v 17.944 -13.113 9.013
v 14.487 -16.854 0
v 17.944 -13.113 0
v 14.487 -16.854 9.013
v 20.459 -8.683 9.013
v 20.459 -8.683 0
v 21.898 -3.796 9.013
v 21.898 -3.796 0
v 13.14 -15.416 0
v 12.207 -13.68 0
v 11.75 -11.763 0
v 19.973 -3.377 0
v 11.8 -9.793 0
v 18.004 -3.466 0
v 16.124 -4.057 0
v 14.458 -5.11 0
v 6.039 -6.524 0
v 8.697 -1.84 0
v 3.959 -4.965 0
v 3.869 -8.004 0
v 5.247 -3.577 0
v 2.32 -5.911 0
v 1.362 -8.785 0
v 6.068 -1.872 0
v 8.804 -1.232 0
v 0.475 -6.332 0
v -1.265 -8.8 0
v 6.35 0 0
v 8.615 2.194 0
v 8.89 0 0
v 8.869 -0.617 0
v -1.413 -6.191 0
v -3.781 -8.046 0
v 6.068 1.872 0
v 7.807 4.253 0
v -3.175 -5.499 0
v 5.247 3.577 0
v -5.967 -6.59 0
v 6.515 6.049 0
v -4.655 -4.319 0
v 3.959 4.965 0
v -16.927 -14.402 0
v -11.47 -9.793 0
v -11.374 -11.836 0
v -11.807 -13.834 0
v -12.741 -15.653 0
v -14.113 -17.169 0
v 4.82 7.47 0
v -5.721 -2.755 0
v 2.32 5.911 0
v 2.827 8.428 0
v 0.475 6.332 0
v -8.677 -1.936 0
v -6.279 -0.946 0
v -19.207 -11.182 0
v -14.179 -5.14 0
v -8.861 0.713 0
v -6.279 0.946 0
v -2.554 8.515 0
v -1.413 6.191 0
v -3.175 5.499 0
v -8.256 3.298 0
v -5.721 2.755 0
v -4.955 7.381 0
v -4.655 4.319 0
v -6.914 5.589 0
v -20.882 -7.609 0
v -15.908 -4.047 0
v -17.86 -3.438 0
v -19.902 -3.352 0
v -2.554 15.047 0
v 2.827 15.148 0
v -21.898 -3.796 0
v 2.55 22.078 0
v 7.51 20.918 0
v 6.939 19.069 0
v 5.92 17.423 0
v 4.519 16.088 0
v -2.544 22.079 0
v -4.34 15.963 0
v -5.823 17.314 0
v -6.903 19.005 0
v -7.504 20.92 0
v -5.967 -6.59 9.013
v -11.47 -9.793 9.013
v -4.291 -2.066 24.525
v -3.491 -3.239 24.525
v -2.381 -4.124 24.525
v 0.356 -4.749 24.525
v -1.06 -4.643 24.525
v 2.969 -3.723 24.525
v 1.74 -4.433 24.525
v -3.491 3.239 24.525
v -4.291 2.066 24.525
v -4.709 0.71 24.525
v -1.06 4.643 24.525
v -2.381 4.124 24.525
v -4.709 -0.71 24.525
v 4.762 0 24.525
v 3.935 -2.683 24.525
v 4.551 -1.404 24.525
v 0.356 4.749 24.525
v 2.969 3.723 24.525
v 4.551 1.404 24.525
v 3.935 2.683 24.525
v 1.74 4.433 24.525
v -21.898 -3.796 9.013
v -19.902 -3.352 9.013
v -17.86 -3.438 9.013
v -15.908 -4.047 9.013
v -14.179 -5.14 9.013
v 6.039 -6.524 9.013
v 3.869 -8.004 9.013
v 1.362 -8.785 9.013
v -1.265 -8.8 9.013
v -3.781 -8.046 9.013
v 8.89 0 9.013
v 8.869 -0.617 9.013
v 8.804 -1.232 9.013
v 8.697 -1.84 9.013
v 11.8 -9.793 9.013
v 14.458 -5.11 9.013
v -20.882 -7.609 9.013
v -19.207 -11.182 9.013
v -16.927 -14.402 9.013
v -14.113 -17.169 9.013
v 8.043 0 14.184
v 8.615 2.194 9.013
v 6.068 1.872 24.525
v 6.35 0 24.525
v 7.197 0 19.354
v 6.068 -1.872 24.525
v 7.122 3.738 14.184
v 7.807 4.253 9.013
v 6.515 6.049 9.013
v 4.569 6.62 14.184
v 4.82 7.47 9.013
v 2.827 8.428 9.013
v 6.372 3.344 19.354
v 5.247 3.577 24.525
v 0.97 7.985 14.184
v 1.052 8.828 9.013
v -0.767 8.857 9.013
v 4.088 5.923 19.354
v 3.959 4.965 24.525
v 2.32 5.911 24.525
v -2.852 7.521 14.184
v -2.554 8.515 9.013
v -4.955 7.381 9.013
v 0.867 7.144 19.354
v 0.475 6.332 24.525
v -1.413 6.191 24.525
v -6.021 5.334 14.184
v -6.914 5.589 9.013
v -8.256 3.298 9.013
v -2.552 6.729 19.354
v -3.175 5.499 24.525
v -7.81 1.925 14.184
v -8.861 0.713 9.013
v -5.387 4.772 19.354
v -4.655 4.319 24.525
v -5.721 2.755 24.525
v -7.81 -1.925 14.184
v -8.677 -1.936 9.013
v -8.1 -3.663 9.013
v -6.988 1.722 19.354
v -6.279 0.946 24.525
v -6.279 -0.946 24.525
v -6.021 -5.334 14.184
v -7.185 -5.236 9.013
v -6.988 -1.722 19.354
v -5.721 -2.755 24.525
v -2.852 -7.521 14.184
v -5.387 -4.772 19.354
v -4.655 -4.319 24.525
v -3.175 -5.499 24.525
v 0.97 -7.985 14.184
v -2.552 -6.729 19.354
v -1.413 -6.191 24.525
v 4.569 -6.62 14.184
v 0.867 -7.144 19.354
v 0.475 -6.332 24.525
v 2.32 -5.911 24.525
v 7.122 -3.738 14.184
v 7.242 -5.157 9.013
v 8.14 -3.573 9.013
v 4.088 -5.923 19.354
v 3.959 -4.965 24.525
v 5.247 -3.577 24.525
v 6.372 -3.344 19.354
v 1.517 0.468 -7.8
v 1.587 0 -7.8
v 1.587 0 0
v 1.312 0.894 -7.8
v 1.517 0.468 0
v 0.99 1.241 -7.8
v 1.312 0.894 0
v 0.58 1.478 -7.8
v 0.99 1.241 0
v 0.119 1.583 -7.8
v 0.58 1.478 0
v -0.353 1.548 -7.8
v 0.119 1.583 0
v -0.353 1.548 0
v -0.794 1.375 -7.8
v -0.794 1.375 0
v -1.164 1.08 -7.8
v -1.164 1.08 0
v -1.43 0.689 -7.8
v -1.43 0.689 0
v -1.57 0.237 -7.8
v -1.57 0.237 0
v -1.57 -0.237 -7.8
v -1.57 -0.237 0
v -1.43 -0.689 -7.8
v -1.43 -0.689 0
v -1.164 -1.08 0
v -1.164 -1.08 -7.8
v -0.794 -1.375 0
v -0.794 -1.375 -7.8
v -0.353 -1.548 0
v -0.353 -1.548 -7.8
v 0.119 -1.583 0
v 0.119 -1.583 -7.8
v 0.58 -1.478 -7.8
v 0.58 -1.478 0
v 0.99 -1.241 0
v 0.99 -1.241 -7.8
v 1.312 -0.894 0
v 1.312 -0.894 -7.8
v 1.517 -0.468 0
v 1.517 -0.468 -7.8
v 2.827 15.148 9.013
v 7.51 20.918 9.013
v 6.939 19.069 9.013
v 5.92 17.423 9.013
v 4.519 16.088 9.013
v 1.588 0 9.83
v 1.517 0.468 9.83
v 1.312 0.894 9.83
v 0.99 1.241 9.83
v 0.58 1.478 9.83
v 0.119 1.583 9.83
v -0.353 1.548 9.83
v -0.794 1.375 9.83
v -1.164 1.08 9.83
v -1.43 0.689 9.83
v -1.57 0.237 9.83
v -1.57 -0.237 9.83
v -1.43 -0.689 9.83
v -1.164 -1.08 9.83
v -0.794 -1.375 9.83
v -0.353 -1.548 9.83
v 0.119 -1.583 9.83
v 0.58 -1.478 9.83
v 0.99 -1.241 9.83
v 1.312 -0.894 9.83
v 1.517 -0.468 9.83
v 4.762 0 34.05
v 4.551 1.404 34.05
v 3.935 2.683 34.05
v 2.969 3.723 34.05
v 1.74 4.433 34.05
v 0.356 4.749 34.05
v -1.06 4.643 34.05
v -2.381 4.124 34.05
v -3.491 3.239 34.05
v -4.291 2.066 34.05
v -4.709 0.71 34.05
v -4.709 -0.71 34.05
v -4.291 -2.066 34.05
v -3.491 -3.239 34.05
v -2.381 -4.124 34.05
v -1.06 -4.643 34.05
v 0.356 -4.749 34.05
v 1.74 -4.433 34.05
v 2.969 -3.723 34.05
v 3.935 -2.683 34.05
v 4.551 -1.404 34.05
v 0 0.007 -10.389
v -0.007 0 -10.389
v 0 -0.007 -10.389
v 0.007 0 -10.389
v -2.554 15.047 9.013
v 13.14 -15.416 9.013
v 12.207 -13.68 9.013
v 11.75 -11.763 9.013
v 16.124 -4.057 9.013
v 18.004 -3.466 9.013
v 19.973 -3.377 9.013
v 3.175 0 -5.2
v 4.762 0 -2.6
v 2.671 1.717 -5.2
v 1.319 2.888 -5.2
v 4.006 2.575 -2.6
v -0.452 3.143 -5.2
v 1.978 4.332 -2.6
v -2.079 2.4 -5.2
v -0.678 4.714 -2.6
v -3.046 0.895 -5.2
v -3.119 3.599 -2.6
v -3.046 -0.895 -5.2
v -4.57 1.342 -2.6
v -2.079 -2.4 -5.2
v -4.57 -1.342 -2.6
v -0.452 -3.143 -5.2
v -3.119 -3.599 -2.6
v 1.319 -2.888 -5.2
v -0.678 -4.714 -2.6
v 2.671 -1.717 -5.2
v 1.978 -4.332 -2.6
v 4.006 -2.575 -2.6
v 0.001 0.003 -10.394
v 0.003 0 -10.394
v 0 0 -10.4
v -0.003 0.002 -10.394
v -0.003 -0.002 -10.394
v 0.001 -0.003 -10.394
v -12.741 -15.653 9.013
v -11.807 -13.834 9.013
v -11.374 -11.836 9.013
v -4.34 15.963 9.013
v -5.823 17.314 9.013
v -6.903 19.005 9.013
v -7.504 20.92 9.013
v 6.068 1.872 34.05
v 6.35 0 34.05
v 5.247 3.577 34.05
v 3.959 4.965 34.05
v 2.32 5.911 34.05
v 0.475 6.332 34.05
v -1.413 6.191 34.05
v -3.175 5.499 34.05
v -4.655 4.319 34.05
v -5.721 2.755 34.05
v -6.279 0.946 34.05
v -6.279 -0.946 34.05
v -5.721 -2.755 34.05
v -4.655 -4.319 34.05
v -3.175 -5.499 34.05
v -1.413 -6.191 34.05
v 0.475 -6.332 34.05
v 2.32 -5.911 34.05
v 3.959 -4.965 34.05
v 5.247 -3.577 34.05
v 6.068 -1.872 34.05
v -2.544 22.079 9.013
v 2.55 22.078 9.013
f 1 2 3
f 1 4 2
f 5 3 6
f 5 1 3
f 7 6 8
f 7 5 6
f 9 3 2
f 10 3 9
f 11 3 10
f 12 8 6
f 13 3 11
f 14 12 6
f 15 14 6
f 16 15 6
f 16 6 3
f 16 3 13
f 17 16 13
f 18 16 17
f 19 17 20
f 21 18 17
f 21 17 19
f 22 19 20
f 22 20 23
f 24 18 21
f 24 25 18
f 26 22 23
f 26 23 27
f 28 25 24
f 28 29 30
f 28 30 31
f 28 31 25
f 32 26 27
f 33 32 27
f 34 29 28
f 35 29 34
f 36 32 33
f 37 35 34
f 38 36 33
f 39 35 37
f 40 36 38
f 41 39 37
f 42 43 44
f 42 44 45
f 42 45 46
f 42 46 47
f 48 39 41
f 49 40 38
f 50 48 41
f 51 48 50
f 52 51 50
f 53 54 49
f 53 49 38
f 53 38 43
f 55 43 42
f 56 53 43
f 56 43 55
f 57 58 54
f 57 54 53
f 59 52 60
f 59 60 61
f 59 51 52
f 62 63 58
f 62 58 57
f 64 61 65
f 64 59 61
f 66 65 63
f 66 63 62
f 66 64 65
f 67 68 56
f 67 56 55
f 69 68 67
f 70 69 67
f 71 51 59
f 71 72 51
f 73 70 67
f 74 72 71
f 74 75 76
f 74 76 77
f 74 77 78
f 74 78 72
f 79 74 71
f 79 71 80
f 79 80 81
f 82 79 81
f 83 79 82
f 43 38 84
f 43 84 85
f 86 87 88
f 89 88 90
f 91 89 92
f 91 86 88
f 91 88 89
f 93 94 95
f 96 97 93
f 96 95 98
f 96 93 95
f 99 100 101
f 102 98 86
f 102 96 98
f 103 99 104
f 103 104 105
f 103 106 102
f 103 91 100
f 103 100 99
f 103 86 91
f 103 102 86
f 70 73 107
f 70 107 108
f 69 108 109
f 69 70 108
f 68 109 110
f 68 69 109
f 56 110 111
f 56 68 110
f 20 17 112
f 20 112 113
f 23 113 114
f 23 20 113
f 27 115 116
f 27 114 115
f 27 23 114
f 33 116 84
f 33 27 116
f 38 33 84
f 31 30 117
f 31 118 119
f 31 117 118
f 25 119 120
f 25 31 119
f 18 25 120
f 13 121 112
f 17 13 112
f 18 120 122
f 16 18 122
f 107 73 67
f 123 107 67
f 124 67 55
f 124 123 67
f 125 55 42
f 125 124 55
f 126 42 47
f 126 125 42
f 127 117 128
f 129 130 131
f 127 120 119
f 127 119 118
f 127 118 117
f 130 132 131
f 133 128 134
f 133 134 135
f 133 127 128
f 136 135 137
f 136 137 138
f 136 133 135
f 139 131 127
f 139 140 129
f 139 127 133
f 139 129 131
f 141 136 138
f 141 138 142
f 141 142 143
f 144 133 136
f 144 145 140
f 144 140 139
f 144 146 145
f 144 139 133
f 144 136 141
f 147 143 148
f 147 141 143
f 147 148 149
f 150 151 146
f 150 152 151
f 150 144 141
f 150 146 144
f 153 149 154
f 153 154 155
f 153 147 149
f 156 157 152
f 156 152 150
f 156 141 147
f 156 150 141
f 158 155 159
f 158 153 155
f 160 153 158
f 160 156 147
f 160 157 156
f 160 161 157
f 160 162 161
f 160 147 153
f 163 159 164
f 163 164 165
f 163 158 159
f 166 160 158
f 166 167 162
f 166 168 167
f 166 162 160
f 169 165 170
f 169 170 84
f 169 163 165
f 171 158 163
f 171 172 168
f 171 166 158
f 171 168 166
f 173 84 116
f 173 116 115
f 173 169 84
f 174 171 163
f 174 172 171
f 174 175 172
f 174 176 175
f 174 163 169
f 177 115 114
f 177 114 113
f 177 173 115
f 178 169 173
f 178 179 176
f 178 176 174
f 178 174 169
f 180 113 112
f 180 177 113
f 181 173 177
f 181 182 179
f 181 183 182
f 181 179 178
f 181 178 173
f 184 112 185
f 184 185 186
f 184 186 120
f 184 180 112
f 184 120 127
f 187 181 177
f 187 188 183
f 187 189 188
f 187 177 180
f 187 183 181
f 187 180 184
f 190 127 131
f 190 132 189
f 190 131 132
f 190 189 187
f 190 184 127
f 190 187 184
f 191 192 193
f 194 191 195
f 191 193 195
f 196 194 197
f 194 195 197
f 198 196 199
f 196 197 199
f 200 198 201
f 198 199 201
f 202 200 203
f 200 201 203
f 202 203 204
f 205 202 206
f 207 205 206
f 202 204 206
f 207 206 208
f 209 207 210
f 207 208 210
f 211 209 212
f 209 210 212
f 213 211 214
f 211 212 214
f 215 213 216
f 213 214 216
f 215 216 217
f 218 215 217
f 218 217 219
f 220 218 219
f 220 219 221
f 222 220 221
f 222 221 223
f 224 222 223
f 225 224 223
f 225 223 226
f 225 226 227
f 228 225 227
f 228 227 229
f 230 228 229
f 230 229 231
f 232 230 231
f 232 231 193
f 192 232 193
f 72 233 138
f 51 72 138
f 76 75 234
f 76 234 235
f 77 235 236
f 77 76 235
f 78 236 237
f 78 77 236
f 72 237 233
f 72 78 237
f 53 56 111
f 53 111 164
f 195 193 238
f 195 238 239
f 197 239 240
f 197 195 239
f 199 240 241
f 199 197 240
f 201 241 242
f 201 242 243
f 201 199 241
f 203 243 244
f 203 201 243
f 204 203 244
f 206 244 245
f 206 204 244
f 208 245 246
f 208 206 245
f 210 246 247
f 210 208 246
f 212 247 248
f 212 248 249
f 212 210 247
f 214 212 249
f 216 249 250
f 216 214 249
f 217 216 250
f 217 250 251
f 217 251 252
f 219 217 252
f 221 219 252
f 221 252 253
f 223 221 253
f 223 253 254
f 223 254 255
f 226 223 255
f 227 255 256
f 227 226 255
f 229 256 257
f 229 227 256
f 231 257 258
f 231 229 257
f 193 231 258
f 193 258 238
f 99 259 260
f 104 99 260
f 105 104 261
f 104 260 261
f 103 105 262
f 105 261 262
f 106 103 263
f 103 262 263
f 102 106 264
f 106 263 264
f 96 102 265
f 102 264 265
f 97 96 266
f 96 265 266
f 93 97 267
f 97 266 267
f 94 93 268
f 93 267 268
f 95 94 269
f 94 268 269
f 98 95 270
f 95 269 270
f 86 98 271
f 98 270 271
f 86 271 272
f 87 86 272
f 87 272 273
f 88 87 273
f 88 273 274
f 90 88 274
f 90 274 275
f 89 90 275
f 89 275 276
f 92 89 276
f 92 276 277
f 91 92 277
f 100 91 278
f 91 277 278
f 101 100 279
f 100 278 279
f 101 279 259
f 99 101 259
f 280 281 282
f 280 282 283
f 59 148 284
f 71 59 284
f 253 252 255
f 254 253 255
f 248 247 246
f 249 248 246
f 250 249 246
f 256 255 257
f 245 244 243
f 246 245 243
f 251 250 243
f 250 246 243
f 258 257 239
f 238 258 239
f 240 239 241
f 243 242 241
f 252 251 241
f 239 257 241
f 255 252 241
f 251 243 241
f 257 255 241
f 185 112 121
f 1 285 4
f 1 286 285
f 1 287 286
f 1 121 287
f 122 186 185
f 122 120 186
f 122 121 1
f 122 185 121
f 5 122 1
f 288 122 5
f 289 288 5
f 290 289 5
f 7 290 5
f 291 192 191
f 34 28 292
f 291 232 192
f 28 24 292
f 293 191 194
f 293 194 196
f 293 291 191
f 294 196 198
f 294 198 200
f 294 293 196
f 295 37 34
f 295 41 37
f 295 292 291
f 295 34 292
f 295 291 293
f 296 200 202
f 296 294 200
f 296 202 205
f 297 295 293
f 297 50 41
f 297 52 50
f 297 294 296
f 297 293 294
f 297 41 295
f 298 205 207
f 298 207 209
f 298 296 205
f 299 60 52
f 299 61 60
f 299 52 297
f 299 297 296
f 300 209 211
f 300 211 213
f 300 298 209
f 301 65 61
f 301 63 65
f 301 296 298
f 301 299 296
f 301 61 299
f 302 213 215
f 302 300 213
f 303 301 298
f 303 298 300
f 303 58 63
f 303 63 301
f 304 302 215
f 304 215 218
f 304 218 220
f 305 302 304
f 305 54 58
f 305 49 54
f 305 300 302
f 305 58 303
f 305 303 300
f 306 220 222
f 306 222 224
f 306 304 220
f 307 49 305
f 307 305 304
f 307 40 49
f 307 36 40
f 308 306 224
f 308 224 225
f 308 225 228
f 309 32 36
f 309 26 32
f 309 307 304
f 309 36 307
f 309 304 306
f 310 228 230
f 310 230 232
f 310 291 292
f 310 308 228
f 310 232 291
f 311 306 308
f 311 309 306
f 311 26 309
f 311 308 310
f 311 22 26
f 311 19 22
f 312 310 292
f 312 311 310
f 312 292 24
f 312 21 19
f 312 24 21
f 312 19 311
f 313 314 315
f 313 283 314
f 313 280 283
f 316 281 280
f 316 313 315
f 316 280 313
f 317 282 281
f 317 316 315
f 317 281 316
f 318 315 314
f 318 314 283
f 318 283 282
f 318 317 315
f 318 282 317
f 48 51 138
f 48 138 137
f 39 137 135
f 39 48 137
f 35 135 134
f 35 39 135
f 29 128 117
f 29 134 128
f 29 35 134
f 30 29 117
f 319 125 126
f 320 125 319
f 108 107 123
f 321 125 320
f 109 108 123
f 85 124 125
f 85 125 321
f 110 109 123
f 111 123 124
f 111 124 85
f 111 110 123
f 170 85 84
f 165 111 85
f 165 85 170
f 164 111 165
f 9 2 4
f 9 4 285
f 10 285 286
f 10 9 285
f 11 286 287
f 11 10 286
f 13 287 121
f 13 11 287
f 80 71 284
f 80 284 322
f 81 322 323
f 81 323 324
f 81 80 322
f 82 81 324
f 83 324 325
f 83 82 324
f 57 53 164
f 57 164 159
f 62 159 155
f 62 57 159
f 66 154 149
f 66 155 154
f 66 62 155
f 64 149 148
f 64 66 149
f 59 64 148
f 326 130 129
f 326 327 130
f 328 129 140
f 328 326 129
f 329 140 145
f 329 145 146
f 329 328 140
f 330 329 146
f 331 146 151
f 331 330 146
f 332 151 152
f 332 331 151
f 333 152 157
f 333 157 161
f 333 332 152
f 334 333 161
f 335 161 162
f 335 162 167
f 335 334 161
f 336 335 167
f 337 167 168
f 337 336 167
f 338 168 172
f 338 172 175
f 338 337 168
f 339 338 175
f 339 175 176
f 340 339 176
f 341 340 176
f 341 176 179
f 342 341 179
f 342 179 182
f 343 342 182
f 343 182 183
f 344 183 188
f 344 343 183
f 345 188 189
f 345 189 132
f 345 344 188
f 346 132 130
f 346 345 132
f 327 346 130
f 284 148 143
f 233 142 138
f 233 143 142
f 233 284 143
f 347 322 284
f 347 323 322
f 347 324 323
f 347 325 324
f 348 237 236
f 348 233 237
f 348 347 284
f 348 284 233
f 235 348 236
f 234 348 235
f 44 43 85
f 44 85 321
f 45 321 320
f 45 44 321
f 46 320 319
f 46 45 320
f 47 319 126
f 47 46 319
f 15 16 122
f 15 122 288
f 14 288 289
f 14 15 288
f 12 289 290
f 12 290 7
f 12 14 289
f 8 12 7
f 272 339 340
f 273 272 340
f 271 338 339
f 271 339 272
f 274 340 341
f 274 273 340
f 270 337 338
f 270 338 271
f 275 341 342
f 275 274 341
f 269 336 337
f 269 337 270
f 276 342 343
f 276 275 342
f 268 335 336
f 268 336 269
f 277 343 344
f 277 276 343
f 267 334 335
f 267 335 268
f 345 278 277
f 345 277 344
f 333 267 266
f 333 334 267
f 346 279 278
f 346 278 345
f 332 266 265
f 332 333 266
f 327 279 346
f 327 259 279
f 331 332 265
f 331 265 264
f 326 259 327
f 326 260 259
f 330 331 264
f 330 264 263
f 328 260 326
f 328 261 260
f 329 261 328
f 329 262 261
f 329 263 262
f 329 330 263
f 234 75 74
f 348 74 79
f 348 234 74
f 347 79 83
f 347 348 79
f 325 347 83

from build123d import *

# Parameters (mm, degrees)
F3_DEPTH = 14.097
F4_R     = 4.7625
F5_DEPTH = 9.525
F6_R     = 1.5875
F7_DEPTH = 10.3886
F8_R     = 1.5875
F9_DEPTH = 9.8298


with BuildPart() as f1:
    # F0 (on Front) → F1 (revolve)
    with BuildSketch(Plane.XZ):
        Polygon((6.35, 24.5250865847), (6.35, 34.0500865847), (0, 34.0500865847), (0, -10.3999134153), (6.35, 0), (22.225, 0), (22.225, 9.0132579207), (8.8899998294, 9.0132579207), align=None)
    revolve(axis=Axis((0, 0, 11.8250865847), (0, 0, 1)))

    # F2 (on Top) → F3 (cut)
    with BuildSketch(Plane.XY):
        with BuildLine():
            ThreePointArc((-14.113121628, -17.1688794892), (0.2443956371, -22.2236562197), (14.487278372, -16.8543582011))
            ThreePointArc((14.487278372, -16.8543582011), (12.207059324, -13.6802064233), (11.8003316443, -9.7931495662))
            Line((11.8003316443, -9.7931495662), (6.0394839652, -6.5235522098))
            ThreePointArc((6.0394839652, -6.5235522098), (0.0488798663, -8.889865621), (-5.9673830231, -6.5895705365))
            Line((-5.9673830231, -6.5895705365), (-11.470085079, -9.7931648991))
            ThreePointArc((-11.470085079, -9.7931648991), (-11.8071714813, -13.8337865787), (-14.113121628, -17.1688794892))
        make_face()
        with BuildLine():
            ThreePointArc((21.8983417722, -3.7964789779), (22.1431848532, -1.9052531477), (22.225, 0))
            ThreePointArc((22.225, 0), (18.1777280494, 12.7875262644), (7.5099648628, 20.9177210221))
            ThreePointArc((7.5099648628, 20.9177210221), (5.9196955053, 17.4232913204), (2.8274223411, 15.1478040653))
            Line((2.8274223411, 15.1478040653), (2.8274223411, 8.4283914779))
            ThreePointArc((2.8274223411, 8.4283914779), (7.2169205556, 5.1911614976), (8.89, 0))
            ThreePointArc((8.89, 0), (8.8417204308, -0.9252458182), (8.6974061138, -1.8404420369))
            Line((8.6974061138, -1.8404420369), (14.4582537929, -5.1100393933))
            ThreePointArc((14.4582537929, -5.1100393933), (18.0040397888, -3.4662510593), (21.8983417722, -3.7964789779))
        make_face()
        with BuildLine():
            ThreePointArc((-2.5544860487, 15.0469797465), (-5.8234880662, 17.3140797385), (-7.5044304492, 20.9197071833))
            ThreePointArc((-7.5044304492, 20.9197071833), (-19.2055517537, 11.1846952054), (-21.8983417722, -3.7964789779))
            ThreePointArc((-21.8983417722, -3.7964789779), (-17.8595819955, -3.4377725991), (-14.1793440119, -5.1395655315))
            Line((-14.1793440119, -5.1395655315), (-8.676641956, -1.9359711689))
            ThreePointArc((-8.676641956, -1.9359711689), (-7.6707699458, 4.4934828851), (-2.5544860487, 8.5150866717))
            Line((-2.5544860487, 8.5150866717), (-2.5544860487, 15.0469797465))
        make_face()
    extrude(amount=F3_DEPTH, mode=Mode.SUBTRACT)

    # F4 (on face) → F5 (cut)
    with BuildSketch(Plane.XY.offset(34.0500865847)):
        Circle(F4_R)
    extrude(amount=-F5_DEPTH, mode=Mode.SUBTRACT)

    # F6 (on Top) → F7 (cut)
    with BuildSketch(Plane.XY):
        Circle(F6_R)
    extrude(amount=-F7_DEPTH, mode=Mode.SUBTRACT)

    # F8 (on Top) → F9 (cut)
    with BuildSketch(Plane.XY):
        Circle(F8_R)
    extrude(amount=F9_DEPTH, mode=Mode.SUBTRACT)


solid = f1.part
